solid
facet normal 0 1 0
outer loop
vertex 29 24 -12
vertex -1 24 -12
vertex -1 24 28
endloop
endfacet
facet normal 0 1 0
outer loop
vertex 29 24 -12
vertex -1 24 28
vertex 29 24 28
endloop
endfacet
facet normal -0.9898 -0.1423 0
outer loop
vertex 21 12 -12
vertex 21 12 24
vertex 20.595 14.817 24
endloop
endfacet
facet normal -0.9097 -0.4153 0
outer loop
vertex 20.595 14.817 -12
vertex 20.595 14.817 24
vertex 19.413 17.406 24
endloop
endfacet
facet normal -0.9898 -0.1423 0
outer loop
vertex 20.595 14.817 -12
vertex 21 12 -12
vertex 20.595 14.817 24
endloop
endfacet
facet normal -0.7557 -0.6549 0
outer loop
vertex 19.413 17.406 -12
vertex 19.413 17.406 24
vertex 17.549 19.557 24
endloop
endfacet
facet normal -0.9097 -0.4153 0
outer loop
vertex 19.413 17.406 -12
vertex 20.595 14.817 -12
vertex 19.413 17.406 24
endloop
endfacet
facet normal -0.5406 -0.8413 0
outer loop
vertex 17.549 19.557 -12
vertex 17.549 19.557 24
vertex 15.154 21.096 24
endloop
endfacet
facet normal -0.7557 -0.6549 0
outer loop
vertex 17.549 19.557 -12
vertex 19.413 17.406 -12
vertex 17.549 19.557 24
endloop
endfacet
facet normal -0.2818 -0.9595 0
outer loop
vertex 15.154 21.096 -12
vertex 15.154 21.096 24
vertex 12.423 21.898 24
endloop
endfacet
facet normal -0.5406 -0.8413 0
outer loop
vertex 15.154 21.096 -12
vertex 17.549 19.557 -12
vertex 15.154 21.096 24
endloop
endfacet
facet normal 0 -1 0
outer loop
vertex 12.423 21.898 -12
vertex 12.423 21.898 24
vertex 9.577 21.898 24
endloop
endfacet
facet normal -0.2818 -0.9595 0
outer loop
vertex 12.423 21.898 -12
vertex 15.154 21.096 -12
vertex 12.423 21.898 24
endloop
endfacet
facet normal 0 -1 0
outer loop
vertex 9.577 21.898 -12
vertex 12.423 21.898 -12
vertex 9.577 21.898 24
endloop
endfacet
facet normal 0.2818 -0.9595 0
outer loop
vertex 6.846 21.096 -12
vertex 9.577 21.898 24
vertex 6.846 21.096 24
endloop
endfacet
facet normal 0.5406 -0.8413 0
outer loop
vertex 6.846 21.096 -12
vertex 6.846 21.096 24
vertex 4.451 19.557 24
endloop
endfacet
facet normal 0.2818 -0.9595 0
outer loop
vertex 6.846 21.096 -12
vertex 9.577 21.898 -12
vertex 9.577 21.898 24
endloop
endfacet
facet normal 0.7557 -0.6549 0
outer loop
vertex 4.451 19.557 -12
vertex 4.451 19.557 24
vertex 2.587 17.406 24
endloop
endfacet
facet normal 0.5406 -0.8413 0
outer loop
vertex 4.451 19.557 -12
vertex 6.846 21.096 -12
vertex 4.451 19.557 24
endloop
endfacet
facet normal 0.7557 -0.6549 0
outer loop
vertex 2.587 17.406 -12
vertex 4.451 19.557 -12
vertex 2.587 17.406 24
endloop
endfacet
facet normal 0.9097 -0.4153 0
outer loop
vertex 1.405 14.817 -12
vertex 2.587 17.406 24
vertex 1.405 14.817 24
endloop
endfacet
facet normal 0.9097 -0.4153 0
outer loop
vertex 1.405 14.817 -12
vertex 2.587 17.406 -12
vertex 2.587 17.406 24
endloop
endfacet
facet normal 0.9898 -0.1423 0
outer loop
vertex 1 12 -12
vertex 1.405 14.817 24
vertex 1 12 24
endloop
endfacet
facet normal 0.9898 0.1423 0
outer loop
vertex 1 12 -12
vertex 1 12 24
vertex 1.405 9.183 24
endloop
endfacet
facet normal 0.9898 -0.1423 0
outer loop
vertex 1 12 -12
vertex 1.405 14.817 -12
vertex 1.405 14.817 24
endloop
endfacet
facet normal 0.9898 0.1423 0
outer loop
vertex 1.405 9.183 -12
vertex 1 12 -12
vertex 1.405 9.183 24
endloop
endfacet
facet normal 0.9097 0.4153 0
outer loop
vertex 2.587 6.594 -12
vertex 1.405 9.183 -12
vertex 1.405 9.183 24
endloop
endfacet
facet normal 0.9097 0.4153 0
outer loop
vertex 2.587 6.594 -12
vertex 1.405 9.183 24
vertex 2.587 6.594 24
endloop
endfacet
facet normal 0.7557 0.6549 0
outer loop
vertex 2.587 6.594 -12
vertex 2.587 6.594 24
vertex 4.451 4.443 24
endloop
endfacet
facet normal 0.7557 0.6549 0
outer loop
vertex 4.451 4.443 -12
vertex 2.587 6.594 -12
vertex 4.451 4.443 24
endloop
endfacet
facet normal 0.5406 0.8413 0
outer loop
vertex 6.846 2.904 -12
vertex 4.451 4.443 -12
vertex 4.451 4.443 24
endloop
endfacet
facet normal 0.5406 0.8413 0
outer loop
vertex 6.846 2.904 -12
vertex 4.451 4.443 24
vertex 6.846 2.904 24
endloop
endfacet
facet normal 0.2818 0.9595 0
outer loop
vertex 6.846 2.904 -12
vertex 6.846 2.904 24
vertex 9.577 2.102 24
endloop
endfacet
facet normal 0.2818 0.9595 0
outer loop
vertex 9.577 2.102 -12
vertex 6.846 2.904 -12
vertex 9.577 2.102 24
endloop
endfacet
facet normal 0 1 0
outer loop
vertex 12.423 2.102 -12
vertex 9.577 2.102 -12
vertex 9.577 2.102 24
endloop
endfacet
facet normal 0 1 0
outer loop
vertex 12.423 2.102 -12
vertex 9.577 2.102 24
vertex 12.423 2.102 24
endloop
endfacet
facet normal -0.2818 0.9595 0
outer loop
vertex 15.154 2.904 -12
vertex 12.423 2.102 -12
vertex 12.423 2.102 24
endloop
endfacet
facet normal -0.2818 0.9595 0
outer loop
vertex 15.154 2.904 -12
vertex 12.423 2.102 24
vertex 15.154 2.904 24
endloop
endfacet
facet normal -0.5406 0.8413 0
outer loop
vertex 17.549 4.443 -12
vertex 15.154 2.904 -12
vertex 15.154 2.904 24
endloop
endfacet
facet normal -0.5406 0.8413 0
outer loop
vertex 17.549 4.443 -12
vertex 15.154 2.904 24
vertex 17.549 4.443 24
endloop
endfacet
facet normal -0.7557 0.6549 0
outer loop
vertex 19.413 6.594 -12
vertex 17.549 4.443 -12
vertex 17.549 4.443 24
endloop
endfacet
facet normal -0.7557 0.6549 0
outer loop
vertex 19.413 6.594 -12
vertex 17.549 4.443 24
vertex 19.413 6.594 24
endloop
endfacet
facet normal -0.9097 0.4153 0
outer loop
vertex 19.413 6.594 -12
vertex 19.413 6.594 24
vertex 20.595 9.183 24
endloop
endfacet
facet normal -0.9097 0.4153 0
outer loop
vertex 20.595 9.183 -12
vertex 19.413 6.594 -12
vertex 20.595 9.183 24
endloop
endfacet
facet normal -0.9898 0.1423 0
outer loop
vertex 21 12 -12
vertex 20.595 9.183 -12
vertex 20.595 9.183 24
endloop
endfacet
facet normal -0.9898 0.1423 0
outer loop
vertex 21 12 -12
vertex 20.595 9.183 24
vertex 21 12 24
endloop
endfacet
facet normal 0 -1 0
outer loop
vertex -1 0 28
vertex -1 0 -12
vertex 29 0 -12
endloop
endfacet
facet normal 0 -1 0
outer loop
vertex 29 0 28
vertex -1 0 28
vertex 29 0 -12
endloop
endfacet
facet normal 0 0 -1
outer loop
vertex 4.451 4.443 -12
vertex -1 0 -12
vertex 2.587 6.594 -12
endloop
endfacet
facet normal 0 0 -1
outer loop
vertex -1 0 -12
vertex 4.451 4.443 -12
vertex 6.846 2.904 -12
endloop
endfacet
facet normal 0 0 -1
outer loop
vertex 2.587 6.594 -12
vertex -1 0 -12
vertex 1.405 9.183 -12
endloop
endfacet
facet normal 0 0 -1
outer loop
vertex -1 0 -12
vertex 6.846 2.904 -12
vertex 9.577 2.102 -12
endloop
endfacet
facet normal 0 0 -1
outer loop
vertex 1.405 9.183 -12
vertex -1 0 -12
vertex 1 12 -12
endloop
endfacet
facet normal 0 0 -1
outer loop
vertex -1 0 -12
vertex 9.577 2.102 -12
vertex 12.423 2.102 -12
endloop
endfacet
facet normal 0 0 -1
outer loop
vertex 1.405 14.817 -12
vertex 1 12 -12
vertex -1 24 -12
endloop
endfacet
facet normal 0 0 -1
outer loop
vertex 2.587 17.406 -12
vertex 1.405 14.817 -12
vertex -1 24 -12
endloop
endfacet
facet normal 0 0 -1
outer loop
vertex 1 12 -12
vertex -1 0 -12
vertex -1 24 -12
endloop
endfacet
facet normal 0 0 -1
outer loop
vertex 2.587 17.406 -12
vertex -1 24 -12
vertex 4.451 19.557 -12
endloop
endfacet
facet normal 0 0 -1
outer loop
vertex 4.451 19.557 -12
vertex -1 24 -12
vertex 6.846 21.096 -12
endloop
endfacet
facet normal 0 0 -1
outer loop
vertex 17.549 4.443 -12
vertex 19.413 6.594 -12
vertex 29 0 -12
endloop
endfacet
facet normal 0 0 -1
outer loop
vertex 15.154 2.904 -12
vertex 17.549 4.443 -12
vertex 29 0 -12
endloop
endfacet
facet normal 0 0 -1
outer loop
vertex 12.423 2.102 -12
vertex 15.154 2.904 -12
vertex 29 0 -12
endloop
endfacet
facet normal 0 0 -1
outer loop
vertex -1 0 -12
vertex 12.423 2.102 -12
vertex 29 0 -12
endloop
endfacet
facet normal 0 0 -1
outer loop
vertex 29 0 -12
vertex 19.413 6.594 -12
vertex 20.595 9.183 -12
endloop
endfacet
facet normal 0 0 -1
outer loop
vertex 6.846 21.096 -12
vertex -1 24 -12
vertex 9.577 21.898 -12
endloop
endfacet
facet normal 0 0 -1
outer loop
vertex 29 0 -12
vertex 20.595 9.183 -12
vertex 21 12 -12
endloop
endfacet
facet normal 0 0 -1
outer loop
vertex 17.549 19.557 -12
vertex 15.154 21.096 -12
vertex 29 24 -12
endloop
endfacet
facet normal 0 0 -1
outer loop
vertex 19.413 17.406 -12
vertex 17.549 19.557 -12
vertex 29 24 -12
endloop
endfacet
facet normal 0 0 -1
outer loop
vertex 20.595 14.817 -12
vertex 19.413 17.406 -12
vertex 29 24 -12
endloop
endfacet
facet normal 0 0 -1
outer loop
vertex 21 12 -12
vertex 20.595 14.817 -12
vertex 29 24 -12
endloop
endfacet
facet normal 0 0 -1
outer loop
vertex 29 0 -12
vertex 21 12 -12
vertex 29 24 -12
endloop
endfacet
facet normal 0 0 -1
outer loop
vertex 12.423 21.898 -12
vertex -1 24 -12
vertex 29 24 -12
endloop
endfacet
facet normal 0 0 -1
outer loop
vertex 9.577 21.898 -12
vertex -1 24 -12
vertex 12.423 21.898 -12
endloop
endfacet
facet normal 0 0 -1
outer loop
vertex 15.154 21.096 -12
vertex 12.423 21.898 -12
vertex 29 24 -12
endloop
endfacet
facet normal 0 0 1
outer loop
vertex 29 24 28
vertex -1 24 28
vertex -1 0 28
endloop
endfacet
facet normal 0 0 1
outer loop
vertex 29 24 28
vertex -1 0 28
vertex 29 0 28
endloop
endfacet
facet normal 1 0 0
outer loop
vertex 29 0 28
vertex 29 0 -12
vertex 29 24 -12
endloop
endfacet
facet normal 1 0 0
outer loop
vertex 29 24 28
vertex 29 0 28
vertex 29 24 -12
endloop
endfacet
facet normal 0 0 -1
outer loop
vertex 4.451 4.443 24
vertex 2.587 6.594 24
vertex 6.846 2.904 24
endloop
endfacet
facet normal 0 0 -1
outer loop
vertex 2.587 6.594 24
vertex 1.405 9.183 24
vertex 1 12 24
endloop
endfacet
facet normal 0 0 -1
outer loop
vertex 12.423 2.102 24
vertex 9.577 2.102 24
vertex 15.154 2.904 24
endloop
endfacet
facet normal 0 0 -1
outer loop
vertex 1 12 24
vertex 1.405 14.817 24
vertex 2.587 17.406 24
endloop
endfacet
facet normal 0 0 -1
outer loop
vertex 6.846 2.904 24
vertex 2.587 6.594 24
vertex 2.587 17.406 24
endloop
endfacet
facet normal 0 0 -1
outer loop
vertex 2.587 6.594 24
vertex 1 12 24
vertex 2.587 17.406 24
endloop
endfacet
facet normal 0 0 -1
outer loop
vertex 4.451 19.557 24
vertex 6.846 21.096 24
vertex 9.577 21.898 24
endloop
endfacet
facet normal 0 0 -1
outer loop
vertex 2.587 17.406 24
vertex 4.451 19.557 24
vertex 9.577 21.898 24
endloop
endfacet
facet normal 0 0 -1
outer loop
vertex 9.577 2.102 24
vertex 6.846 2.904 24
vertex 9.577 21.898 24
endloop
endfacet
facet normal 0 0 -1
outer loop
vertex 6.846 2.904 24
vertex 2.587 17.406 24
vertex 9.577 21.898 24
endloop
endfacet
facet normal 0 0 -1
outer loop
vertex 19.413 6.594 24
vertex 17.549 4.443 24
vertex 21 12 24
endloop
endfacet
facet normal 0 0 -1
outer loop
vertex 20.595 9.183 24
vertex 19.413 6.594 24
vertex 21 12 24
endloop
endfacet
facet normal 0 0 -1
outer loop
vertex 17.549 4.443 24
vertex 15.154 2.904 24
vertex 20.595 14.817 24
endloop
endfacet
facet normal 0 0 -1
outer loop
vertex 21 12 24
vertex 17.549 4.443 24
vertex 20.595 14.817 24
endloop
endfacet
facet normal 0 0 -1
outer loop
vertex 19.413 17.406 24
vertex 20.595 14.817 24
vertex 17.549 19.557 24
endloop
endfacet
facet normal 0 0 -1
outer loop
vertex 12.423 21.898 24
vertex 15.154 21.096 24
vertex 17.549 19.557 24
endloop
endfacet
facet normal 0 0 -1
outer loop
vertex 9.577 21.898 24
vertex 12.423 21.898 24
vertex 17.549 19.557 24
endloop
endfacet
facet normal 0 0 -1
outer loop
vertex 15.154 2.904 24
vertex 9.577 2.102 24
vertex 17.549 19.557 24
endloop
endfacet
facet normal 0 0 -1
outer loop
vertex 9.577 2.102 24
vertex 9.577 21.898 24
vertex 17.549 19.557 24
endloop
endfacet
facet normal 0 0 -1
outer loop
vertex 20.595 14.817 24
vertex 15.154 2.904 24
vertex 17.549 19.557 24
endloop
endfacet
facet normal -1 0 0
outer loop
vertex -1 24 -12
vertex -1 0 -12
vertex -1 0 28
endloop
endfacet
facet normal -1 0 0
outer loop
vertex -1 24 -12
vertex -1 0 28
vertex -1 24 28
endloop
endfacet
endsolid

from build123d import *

# Parameters (mm, degrees)
CYLINDER_R     = 10
CYLINDER_DEPTH = 40
BOX_W          = 30
BOX_H          = 24
BOX_DEPTH      = 40


with BuildPart() as cilindro:
    # Cylinder → Cylinder (new body)
    with BuildSketch(Plane(origin=(11, 12, -16), x_dir=(1, 0, 0), z_dir=(0, 0, 1))):
        Circle(CYLINDER_R)
    extrude(amount=CYLINDER_DEPTH)


with BuildPart() as cut:
    # Box → Box (new body)
    with BuildSketch(Plane(origin=(-1, 0, -12), x_dir=(1, 0, 0), z_dir=(0, 0, 1))):
        with Locations((15, 12)):
            Rectangle(BOX_W, BOX_H)
    extrude(amount=BOX_DEPTH)

    # Cut: cut Cilindro
    add(cilindro.part, mode=Mode.SUBTRACT)


solid = cut.part
